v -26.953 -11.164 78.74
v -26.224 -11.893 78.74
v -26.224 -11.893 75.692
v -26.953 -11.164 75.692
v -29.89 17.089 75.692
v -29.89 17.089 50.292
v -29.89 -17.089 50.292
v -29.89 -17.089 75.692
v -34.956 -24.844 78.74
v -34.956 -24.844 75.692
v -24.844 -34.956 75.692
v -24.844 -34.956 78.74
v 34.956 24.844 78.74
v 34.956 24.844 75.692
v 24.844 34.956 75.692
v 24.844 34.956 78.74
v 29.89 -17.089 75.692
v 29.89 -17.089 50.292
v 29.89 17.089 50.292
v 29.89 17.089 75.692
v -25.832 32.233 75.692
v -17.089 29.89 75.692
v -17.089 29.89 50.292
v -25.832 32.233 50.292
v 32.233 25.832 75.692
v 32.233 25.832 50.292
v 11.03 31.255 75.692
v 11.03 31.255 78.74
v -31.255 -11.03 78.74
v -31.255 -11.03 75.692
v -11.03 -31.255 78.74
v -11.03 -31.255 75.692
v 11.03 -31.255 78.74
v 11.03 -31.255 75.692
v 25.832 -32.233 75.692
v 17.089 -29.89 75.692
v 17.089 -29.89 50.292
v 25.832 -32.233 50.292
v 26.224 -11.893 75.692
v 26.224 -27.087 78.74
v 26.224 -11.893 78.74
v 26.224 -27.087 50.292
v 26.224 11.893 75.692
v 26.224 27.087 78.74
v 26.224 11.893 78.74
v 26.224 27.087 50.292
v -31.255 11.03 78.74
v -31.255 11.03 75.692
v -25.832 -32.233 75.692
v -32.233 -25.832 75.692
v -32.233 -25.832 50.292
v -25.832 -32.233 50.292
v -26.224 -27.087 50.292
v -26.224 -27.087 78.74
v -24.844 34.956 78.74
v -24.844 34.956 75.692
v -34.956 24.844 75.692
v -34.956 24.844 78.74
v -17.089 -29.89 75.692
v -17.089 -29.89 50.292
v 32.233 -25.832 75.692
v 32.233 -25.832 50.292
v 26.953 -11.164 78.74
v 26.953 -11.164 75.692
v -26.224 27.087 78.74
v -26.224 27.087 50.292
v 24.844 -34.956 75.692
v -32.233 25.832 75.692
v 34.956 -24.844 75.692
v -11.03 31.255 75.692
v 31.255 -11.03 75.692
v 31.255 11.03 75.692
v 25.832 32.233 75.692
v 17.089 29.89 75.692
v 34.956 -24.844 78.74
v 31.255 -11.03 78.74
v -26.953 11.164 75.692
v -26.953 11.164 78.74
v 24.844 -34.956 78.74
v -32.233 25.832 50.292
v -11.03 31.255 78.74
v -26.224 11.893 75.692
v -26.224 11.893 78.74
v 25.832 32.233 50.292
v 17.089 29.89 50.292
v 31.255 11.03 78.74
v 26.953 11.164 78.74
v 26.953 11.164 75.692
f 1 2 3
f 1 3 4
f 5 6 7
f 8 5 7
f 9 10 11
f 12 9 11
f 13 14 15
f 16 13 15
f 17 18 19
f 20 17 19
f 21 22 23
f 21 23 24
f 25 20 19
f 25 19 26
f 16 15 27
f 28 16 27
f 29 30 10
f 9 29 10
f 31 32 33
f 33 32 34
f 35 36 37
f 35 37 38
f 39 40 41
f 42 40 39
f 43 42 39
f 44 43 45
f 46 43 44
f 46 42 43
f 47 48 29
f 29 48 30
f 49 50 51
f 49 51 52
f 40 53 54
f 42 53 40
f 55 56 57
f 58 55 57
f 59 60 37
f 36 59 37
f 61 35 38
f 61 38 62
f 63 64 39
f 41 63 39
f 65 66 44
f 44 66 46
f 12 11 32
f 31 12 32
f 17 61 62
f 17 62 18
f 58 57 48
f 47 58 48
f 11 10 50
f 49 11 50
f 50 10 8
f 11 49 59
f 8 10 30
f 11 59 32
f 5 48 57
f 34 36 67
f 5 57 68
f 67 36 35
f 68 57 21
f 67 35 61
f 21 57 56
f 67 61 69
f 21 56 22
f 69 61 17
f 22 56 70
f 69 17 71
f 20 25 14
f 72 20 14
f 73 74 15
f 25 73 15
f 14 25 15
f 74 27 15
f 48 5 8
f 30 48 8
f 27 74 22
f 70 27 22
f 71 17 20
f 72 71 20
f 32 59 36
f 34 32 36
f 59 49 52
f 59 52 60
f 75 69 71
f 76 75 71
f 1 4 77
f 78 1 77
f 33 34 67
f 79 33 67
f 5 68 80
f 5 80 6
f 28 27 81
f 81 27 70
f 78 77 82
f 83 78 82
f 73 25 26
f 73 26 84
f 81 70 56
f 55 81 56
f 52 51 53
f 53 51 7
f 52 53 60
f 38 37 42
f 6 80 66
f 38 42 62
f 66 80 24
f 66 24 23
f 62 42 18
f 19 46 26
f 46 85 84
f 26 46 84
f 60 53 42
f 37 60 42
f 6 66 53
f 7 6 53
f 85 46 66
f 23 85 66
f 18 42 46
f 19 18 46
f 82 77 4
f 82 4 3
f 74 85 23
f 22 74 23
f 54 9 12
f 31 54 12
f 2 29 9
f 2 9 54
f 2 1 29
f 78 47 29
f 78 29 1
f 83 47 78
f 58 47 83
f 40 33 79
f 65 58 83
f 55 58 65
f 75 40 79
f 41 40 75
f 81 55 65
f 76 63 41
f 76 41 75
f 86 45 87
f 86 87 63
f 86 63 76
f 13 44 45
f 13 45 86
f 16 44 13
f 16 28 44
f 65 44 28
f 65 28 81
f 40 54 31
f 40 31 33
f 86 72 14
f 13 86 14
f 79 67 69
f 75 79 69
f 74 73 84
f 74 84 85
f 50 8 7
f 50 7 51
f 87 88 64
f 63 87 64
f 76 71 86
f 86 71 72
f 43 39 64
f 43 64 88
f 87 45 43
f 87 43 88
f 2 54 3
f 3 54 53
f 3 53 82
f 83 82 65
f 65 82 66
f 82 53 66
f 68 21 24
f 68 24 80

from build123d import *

# Parameters (mm, degrees)
F5_DEPTH = 25.4
F6_DEPTH = 3.048
F7_W     = 52.44865641
F7_H     = 54.1748739779
F8_DEPTH = 88.646


with BuildPart() as f5:
    # F2 (on offset) → F5 (new body)
    with BuildSketch(Plane.XY.offset(50.292)):
        Polygon((-32.2327940663, -25.8321565638), (-25.8321565638, -32.2327940663), (-17.0887231349, -29.88999814), (-14.7459272086, -21.1465647111), (-21.1465647111, -14.7459272086), (-29.88999814, -17.0887231349), align=None)
        Polygon((-14.7459272086, -21.1465647111), (-17.0887231349, -29.88999814), (17.0887231349, -29.88999814), (14.7459272086, -21.1465647111), align=None)
        Polygon((-29.88999814, 17.0887231349), (-29.88999814, -17.0887231349), (-21.1465647111, -14.7459272086), (-21.1465647111, 14.7459272086), align=None)
        Polygon((14.7459272086, -21.1465647111), (17.0887231349, -29.88999814), (25.8321565638, -32.2327940663), (32.2327940663, -25.8321565638), (29.88999814, -17.0887231349), (21.1465647111, -14.7459272086), align=None)
        Polygon((-32.2327940663, 25.8321565638), (-29.88999814, 17.0887231349), (-21.1465647111, 14.7459272086), (-14.7459272086, 21.1465647111), (-17.0887231349, 29.88999814), (-25.8321565638, 32.2327940663), align=None)
        Polygon((21.1465647111, 14.7459272086), (21.1465647111, -14.7459272086), (29.88999814, -17.0887231349), (29.88999814, 17.0887231349), align=None)
        Polygon((-17.0887231349, 29.88999814), (-14.7459272086, 21.1465647111), (14.7459272086, 21.1465647111), (17.0887231349, 29.88999814), align=None)
        Polygon((14.7459272086, 21.1465647111), (21.1465647111, 14.7459272086), (29.88999814, 17.0887231349), (32.2327940663, 25.8321565638), (25.8321565638, 32.2327940663), (17.0887231349, 29.88999814), align=None)
    extrude(amount=F5_DEPTH)

    # F4 (on offset) → F6 (join)
    with BuildSketch(Plane.XY.offset(75.692)):
        Polygon((-24.8438008947, 34.9560788946), (-34.9560788946, 24.8438008947), (-31.2547282565, 11.0301722567), (-31.2547282565, -11.0301722567), (-34.9560788946, -24.8438008947), (-24.8438008947, -34.9560788946), (-11.0301722567, -31.2547282565), (11.0301722567, -31.2547282565), (24.8438008947, -34.9560788946), (34.9560788946, -24.8438008947), (31.2547282565, -11.0301722567), (31.2547282565, 11.0301722567), (34.9560788946, 24.8438008947), (24.8438008947, 34.9560788946), (11.0301722567, 31.2547282565), (-11.0301722567, 31.2547282565), align=None)
        Polygon((-26.953196153, 11.1643793959), (-11.1643793959, 26.953196153), (11.1643793959, 26.953196153), (26.953196153, 11.1643793959), (26.953196153, -11.1643793959), (11.1643793959, -26.953196153), (-11.1643793959, -26.953196153), (-26.953196153, -11.1643793959), align=None, mode=Mode.SUBTRACT)
    extrude(amount=F6_DEPTH)

    # F7 (on offset) → F8 (cut)
    with BuildSketch(Plane.XY.offset(50.292)):
        Rectangle(F7_W, F7_H)
    extrude(amount=F8_DEPTH, mode=Mode.SUBTRACT)


solid = f5.part
